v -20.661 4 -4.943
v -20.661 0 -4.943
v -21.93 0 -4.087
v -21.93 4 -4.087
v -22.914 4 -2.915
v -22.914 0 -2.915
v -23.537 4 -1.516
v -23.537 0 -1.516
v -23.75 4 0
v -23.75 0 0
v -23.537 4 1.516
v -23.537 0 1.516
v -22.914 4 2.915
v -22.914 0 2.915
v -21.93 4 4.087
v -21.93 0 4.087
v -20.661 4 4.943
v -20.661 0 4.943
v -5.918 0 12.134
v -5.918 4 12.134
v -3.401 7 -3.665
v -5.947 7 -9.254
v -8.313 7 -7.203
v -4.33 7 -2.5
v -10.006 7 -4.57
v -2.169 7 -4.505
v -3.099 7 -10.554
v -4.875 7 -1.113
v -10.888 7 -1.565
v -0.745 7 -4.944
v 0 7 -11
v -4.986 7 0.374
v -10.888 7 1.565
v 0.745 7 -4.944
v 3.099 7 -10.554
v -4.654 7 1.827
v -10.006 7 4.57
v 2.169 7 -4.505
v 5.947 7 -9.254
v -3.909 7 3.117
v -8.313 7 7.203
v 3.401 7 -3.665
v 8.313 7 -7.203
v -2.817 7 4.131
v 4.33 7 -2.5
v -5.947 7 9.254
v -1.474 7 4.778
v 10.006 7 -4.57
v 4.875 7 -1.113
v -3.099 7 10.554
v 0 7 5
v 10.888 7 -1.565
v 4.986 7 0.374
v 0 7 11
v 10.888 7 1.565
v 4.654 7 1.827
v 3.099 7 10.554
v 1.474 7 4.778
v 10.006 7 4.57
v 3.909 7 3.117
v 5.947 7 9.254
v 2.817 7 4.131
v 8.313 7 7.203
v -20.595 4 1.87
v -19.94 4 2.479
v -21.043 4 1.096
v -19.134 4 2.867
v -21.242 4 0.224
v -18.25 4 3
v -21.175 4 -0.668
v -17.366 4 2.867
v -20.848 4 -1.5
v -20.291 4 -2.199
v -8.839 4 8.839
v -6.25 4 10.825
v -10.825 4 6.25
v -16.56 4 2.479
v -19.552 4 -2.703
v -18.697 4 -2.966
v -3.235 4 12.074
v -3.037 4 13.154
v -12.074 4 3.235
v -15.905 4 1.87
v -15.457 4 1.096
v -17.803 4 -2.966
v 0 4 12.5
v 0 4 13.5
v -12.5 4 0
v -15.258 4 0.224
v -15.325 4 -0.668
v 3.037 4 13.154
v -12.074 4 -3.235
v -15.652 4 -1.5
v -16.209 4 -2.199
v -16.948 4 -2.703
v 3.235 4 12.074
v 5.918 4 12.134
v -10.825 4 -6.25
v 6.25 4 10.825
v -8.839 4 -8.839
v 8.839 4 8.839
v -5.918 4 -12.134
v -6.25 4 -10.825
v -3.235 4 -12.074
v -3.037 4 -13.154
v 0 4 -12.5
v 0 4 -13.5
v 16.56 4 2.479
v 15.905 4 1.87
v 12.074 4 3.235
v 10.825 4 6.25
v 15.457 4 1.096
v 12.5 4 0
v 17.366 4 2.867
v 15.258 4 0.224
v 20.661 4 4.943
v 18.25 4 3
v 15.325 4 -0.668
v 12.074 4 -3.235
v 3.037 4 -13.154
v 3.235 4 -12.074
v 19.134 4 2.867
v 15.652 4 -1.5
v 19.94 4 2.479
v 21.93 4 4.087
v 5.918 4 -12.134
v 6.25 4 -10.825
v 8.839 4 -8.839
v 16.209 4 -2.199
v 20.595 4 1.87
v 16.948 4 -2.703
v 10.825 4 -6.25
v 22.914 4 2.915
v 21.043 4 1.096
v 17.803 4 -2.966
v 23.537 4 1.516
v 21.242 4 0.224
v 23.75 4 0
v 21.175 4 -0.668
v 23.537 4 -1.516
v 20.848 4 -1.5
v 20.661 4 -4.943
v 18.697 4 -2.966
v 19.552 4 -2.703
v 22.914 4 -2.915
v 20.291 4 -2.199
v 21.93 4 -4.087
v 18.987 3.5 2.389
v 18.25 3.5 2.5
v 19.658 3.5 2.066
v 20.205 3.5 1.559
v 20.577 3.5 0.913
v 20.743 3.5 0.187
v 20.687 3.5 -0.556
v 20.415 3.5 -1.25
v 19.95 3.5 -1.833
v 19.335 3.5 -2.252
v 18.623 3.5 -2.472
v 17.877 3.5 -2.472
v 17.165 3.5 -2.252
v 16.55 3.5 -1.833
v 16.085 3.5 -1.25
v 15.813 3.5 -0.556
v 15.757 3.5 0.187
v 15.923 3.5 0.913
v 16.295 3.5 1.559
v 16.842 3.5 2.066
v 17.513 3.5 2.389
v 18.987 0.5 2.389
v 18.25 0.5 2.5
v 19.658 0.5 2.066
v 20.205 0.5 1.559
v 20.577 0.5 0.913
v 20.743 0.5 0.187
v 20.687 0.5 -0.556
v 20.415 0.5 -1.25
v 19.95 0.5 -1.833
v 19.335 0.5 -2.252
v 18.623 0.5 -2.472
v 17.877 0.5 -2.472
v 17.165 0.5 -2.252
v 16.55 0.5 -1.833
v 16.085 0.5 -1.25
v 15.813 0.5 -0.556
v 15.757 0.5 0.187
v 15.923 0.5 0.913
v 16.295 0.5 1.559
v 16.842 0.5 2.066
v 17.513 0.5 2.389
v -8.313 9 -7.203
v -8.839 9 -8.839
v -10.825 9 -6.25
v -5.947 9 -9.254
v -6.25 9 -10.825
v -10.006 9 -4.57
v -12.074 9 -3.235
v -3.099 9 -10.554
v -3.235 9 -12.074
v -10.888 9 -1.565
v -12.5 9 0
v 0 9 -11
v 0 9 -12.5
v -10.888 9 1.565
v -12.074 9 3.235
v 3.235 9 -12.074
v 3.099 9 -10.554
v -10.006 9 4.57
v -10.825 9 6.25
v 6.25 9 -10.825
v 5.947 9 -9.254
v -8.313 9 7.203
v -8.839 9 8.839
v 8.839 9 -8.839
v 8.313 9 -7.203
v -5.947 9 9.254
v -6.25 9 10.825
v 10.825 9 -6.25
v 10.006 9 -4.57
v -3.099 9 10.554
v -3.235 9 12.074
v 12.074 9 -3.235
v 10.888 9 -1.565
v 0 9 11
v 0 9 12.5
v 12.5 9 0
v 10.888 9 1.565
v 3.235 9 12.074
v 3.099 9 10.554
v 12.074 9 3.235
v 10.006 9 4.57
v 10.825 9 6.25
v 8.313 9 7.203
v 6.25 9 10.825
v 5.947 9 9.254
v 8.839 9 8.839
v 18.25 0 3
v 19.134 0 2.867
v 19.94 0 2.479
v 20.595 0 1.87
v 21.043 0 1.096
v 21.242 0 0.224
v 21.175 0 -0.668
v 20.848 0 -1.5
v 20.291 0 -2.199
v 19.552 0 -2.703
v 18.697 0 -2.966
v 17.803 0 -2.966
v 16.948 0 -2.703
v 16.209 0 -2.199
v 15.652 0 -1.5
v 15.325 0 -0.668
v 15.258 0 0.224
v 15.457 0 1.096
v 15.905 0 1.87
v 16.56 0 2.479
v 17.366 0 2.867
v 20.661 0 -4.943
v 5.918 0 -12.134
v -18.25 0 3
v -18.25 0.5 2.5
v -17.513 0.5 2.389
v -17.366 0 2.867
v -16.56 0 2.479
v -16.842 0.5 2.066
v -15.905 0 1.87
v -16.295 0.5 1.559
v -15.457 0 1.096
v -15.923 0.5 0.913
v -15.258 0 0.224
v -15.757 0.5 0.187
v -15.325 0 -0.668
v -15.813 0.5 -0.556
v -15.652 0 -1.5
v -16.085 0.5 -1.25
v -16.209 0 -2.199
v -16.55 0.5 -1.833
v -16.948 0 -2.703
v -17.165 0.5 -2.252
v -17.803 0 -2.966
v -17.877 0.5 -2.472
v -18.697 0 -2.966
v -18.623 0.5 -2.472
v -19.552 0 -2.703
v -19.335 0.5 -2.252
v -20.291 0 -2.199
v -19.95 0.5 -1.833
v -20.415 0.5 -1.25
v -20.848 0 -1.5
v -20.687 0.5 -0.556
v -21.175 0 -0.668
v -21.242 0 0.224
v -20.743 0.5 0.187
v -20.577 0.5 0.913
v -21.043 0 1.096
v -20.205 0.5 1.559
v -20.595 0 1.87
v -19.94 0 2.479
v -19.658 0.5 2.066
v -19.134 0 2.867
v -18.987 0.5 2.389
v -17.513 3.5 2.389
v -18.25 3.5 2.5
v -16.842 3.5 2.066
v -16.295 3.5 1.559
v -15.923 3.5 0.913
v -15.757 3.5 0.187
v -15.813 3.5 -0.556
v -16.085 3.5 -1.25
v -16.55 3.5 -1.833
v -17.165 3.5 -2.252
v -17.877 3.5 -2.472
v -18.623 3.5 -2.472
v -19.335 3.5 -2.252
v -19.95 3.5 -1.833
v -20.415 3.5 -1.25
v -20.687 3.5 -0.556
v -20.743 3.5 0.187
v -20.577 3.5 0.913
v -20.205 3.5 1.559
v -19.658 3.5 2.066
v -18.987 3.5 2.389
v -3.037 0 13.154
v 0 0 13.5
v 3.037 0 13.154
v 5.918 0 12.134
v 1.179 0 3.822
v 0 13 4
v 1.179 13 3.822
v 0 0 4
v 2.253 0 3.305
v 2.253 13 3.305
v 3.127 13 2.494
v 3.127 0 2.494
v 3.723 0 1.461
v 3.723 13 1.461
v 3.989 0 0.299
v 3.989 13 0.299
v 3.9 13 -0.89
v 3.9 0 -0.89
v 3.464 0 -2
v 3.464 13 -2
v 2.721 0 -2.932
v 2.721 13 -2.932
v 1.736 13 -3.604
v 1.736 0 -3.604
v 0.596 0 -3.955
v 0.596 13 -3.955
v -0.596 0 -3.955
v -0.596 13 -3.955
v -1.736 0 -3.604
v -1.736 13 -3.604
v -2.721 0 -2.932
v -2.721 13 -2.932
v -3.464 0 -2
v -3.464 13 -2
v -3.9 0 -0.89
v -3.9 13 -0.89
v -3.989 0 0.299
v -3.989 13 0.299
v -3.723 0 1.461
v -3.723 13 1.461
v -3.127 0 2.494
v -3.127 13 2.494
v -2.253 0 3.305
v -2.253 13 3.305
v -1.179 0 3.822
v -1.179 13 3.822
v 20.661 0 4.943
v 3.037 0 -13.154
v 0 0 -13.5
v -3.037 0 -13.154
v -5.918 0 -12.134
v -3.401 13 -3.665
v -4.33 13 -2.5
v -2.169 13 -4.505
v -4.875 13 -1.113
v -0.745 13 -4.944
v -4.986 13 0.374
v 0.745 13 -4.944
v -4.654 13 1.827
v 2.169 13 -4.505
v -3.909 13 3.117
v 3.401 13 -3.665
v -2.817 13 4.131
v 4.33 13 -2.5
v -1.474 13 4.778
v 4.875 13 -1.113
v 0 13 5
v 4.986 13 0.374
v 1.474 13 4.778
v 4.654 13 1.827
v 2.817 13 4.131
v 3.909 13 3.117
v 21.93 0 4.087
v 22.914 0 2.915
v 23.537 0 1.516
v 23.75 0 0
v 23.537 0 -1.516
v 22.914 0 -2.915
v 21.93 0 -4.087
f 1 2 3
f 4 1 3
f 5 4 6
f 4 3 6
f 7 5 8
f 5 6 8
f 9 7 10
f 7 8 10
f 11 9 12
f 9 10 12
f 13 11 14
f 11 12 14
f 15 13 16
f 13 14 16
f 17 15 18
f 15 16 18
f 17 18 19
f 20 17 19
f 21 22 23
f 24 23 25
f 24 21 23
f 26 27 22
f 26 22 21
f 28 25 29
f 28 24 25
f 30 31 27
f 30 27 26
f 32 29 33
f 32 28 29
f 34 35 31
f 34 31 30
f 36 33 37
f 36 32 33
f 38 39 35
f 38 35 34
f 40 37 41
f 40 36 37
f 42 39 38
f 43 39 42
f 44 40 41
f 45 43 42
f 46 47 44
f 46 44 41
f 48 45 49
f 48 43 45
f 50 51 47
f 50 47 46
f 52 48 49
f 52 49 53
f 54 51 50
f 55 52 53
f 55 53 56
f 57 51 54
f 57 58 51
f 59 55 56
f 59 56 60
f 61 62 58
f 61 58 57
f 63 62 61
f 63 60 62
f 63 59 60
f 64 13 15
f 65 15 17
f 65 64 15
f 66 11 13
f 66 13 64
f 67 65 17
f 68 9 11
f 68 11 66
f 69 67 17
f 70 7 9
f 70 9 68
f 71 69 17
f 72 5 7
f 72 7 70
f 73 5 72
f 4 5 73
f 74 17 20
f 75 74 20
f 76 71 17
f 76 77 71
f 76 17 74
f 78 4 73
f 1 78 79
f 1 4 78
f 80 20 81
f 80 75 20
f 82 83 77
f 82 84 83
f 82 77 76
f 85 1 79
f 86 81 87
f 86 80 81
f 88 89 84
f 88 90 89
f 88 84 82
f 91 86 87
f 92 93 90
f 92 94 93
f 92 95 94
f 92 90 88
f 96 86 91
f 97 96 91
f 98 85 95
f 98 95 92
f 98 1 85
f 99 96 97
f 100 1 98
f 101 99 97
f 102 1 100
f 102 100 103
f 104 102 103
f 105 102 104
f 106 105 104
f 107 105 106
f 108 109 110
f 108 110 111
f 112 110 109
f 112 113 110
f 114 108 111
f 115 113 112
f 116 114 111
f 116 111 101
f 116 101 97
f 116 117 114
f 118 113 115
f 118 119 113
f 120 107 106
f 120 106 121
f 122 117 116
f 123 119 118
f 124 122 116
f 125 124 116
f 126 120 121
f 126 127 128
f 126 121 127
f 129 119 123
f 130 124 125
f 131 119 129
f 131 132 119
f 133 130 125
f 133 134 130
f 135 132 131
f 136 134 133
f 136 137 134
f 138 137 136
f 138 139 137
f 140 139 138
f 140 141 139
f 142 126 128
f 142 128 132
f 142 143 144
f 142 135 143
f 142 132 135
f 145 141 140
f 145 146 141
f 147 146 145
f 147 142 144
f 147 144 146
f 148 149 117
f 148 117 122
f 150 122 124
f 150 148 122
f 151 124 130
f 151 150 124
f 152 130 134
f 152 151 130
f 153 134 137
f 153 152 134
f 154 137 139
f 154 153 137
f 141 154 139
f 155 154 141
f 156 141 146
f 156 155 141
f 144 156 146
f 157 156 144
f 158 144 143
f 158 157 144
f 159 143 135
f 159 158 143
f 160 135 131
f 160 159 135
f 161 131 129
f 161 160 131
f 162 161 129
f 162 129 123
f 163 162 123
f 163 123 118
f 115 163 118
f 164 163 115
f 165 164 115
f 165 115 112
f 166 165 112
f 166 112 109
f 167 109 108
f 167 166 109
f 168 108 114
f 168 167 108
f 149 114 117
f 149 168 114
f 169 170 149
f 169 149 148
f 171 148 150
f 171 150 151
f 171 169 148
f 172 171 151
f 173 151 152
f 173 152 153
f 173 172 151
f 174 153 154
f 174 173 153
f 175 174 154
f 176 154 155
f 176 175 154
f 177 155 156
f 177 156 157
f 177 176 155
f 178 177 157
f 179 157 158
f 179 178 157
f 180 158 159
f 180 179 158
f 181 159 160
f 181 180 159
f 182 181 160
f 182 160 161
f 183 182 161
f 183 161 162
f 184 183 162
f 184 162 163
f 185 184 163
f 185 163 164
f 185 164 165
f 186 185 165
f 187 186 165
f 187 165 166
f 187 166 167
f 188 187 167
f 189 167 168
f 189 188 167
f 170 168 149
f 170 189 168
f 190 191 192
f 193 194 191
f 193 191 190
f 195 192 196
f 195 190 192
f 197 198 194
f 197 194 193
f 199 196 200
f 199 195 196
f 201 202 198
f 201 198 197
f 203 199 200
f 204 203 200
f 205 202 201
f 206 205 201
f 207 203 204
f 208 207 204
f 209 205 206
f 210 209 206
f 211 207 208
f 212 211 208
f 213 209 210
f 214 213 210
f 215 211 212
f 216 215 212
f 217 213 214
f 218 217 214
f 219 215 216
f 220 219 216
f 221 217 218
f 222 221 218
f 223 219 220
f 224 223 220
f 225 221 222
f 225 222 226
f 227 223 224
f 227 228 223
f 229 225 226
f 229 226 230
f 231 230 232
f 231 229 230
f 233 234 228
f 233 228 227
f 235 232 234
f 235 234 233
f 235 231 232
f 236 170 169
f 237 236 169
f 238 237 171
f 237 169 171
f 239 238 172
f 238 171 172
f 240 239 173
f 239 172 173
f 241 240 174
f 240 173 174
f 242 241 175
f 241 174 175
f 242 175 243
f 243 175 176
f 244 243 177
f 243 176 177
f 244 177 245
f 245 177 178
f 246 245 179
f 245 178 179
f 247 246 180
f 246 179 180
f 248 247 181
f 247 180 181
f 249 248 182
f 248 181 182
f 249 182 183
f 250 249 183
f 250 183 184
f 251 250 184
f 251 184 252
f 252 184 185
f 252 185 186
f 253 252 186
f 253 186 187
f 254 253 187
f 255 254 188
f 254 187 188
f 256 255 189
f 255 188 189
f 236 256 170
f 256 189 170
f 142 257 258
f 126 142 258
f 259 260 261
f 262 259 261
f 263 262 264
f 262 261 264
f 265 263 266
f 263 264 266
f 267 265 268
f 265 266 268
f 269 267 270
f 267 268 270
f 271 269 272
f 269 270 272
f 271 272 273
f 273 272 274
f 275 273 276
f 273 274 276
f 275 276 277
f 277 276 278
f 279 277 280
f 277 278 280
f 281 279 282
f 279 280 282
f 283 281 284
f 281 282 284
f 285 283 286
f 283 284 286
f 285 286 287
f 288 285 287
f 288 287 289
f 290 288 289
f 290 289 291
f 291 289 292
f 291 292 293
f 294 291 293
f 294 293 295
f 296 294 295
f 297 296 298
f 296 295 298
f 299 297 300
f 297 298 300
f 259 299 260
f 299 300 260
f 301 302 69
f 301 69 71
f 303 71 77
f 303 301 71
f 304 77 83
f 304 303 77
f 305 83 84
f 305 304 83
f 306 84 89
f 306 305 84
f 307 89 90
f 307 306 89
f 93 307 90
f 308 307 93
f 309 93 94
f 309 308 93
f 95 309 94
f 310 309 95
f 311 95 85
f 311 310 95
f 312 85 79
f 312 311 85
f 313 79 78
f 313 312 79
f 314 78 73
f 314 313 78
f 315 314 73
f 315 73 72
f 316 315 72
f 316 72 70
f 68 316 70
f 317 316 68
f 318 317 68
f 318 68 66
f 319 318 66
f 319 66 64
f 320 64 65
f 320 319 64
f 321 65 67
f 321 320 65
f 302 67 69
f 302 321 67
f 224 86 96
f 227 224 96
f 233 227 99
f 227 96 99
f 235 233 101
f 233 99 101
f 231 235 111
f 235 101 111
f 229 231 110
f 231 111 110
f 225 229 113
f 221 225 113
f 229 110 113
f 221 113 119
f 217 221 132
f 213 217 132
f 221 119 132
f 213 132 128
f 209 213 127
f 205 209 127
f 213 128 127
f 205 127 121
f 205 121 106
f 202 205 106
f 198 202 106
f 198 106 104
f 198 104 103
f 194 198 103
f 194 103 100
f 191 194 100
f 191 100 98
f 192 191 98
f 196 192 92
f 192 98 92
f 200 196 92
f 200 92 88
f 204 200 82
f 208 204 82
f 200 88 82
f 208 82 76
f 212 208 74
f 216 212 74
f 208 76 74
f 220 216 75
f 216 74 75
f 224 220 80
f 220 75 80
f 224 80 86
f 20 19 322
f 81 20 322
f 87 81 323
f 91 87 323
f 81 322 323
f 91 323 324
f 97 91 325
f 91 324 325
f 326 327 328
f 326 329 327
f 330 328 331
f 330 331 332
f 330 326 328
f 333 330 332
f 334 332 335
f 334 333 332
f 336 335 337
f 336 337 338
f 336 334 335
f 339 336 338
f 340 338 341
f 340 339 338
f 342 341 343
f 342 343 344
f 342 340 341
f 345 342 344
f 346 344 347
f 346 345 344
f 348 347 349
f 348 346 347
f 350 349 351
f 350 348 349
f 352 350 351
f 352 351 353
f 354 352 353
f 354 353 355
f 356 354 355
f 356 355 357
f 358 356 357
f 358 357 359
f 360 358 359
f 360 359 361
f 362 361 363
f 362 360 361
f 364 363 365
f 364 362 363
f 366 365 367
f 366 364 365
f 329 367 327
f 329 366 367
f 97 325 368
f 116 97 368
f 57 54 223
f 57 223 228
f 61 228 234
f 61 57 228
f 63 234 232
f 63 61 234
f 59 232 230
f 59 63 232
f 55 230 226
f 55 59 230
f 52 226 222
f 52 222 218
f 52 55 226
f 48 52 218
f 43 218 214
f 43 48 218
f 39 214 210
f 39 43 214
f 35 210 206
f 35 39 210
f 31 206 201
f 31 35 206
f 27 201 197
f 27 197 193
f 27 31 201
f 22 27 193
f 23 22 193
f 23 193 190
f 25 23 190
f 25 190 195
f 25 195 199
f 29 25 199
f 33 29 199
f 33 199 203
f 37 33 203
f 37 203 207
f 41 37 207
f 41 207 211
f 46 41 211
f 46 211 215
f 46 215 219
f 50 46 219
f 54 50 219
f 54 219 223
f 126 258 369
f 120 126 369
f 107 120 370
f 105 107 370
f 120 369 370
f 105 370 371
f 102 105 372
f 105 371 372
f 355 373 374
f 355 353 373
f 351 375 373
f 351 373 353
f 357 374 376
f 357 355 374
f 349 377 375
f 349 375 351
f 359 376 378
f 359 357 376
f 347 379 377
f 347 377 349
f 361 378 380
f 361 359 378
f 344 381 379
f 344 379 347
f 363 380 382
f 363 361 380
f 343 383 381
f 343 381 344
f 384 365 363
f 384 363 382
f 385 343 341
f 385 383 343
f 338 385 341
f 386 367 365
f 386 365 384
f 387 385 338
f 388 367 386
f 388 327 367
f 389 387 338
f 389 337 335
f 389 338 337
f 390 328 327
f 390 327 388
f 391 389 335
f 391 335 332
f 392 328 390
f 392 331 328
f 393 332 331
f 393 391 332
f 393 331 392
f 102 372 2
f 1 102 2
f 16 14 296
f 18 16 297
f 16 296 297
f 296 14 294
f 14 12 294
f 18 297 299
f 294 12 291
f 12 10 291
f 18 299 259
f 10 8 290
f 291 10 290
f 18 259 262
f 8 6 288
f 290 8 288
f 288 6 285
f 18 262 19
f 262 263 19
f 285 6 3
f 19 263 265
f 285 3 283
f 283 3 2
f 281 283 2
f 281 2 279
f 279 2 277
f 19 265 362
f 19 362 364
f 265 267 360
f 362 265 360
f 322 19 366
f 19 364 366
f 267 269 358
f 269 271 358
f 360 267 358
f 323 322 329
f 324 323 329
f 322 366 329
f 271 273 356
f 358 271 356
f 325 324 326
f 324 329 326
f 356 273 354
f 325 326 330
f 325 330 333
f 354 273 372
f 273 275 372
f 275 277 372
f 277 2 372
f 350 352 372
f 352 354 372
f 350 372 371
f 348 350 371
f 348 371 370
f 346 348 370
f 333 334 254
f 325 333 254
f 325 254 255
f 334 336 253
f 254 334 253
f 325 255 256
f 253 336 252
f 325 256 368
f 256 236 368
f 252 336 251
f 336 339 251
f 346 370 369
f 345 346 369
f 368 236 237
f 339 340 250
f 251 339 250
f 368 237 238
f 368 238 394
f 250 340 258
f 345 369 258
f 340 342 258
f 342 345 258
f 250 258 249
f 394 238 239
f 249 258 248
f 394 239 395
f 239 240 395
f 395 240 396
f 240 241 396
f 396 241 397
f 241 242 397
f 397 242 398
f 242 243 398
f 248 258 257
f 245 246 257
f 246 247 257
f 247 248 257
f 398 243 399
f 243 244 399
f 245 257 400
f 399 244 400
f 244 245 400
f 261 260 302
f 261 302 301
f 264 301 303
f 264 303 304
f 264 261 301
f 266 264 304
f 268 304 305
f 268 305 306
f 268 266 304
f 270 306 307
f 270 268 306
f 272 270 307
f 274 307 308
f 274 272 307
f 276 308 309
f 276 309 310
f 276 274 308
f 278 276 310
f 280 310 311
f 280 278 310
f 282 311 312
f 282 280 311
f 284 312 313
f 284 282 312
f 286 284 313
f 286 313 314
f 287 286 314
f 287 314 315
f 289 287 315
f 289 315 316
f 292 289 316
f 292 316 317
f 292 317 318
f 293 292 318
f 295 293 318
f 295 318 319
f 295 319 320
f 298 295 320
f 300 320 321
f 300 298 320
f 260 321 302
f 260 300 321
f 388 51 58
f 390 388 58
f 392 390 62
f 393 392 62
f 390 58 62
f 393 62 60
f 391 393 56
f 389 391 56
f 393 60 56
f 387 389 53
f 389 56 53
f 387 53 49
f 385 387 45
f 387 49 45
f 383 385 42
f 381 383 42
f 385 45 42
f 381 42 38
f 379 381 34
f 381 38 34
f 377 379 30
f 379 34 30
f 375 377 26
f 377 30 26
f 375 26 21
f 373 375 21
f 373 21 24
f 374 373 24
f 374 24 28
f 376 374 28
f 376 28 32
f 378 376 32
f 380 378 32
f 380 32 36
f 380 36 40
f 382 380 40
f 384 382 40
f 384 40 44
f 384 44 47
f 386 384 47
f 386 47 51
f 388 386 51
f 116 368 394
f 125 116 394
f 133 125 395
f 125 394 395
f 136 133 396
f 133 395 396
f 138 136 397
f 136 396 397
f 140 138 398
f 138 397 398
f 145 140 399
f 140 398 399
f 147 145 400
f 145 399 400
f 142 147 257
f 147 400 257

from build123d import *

# Parameters (mm, degrees)
CROQUIS1_R              = 4
CROQUIS1_R_2            = 2.5
SALIENTE_EXTRUIR1_DEPTH = 4
CROQUIS2_R              = 5
CROQUIS2_R_2            = 4
SALIENTE_EXTRUIR2_DEPTH = 9
CROQUIS3_R              = 12.5
CROQUIS3_R_2            = 11
SALIENTE_EXTRUIR3_DEPTH = 5
CROQUIS5_R              = 11
CROQUIS5_R_2            = 5
SALIENTE_EXTRUIR4_DEPTH = 3
CHAFL_N1_SIZE           = 0.5


with BuildPart() as part:
    # Croquis1 → Saliente-Extruir1 (new body)
    with BuildSketch(Plane(origin=(0, 0, 0), x_dir=(1, 0, 0), z_dir=(0, 1, 0))):
        with BuildLine():
            Line((-5.917808219, 12.133818273), (-20.660958904, 4.943407445))
            ThreePointArc((-20.660958904, 4.943407445), (-23.75, 0), (-20.660958904, -4.943407445))
            Line((-20.660958904, -4.943407445), (-5.917808219, -12.133818273))
            ThreePointArc((-5.917808219, -12.133818273), (0, -13.5), (5.917808219, -12.133818273))
            Line((5.917808219, -12.133818273), (20.660958904, -4.943407445))
            ThreePointArc((20.660958904, -4.943407445), (23.75, 0), (20.660958904, 4.943407445))
            Line((20.660958904, 4.943407445), (5.917808219, 12.133818273))
            ThreePointArc((5.917808219, 12.133818273), (0, 13.5), (-5.917808219, 12.133818273))
        make_face()
        with Locations(Location((0, 0, 0), (0, 0, 270))):
            Circle(CROQUIS1_R, mode=Mode.SUBTRACT)
        with Locations(Location((-18.25, 0, 0), (0, 0, 270))):
            Circle(CROQUIS1_R_2, mode=Mode.SUBTRACT)
        with Locations(Location((18.25, 0, 0), (0, 0, 270))):
            Circle(CROQUIS1_R_2, mode=Mode.SUBTRACT)
    extrude(amount=SALIENTE_EXTRUIR1_DEPTH)

    # Croquis2 → Saliente-Extruir2 (add)
    with BuildSketch(Plane(origin=(0, 4, 0), x_dir=(1, 0, 0), z_dir=(0, 1, 0))):
        with Locations(Location((0, 0, 0), (0, 0, 270))):
            Circle(CROQUIS2_R)
        with Locations(Location((0, 0, 0), (0, 0, 270))):
            Circle(CROQUIS2_R_2, mode=Mode.SUBTRACT)
    extrude(amount=SALIENTE_EXTRUIR2_DEPTH)

    # Croquis3 → Saliente-Extruir3 (add)
    with BuildSketch(Plane(origin=(0, 4, 0), x_dir=(1, 0, 0), z_dir=(0, 1, 0))):
        with Locations(Location((0, 0, 0), (0, 0, 270))):
            Circle(CROQUIS3_R)
        with Locations(Location((0, 0, 0), (0, 0, 270))):
            Circle(CROQUIS3_R_2, mode=Mode.SUBTRACT)
    extrude(amount=SALIENTE_EXTRUIR3_DEPTH)

    # Croquis5 → Saliente-Extruir4 (add)
    with BuildSketch(Plane(origin=(0, 4, 0), x_dir=(1, 0, 0), z_dir=(0, 1, 0))):
        with Locations(Location((0, 0, 0), (0, 0, 270))):
            Circle(CROQUIS5_R)
        with Locations(Location((0, 0, 0), (0, 0, 270))):
            Circle(CROQUIS5_R_2, mode=Mode.SUBTRACT)
    extrude(amount=SALIENTE_EXTRUIR4_DEPTH)

    # Chaflán1
    chafl_n1_edges = [part.edges().sort_by_distance(p)[0] for p in [
        (-18.25, 0, -2.5),
        (-18.25, 4, -2.5),
        (18.25, 0, -2.5),
        (18.25, 4, -2.5),
    ]]
    chamfer(chafl_n1_edges, length=CHAFL_N1_SIZE)


solid = part.part
